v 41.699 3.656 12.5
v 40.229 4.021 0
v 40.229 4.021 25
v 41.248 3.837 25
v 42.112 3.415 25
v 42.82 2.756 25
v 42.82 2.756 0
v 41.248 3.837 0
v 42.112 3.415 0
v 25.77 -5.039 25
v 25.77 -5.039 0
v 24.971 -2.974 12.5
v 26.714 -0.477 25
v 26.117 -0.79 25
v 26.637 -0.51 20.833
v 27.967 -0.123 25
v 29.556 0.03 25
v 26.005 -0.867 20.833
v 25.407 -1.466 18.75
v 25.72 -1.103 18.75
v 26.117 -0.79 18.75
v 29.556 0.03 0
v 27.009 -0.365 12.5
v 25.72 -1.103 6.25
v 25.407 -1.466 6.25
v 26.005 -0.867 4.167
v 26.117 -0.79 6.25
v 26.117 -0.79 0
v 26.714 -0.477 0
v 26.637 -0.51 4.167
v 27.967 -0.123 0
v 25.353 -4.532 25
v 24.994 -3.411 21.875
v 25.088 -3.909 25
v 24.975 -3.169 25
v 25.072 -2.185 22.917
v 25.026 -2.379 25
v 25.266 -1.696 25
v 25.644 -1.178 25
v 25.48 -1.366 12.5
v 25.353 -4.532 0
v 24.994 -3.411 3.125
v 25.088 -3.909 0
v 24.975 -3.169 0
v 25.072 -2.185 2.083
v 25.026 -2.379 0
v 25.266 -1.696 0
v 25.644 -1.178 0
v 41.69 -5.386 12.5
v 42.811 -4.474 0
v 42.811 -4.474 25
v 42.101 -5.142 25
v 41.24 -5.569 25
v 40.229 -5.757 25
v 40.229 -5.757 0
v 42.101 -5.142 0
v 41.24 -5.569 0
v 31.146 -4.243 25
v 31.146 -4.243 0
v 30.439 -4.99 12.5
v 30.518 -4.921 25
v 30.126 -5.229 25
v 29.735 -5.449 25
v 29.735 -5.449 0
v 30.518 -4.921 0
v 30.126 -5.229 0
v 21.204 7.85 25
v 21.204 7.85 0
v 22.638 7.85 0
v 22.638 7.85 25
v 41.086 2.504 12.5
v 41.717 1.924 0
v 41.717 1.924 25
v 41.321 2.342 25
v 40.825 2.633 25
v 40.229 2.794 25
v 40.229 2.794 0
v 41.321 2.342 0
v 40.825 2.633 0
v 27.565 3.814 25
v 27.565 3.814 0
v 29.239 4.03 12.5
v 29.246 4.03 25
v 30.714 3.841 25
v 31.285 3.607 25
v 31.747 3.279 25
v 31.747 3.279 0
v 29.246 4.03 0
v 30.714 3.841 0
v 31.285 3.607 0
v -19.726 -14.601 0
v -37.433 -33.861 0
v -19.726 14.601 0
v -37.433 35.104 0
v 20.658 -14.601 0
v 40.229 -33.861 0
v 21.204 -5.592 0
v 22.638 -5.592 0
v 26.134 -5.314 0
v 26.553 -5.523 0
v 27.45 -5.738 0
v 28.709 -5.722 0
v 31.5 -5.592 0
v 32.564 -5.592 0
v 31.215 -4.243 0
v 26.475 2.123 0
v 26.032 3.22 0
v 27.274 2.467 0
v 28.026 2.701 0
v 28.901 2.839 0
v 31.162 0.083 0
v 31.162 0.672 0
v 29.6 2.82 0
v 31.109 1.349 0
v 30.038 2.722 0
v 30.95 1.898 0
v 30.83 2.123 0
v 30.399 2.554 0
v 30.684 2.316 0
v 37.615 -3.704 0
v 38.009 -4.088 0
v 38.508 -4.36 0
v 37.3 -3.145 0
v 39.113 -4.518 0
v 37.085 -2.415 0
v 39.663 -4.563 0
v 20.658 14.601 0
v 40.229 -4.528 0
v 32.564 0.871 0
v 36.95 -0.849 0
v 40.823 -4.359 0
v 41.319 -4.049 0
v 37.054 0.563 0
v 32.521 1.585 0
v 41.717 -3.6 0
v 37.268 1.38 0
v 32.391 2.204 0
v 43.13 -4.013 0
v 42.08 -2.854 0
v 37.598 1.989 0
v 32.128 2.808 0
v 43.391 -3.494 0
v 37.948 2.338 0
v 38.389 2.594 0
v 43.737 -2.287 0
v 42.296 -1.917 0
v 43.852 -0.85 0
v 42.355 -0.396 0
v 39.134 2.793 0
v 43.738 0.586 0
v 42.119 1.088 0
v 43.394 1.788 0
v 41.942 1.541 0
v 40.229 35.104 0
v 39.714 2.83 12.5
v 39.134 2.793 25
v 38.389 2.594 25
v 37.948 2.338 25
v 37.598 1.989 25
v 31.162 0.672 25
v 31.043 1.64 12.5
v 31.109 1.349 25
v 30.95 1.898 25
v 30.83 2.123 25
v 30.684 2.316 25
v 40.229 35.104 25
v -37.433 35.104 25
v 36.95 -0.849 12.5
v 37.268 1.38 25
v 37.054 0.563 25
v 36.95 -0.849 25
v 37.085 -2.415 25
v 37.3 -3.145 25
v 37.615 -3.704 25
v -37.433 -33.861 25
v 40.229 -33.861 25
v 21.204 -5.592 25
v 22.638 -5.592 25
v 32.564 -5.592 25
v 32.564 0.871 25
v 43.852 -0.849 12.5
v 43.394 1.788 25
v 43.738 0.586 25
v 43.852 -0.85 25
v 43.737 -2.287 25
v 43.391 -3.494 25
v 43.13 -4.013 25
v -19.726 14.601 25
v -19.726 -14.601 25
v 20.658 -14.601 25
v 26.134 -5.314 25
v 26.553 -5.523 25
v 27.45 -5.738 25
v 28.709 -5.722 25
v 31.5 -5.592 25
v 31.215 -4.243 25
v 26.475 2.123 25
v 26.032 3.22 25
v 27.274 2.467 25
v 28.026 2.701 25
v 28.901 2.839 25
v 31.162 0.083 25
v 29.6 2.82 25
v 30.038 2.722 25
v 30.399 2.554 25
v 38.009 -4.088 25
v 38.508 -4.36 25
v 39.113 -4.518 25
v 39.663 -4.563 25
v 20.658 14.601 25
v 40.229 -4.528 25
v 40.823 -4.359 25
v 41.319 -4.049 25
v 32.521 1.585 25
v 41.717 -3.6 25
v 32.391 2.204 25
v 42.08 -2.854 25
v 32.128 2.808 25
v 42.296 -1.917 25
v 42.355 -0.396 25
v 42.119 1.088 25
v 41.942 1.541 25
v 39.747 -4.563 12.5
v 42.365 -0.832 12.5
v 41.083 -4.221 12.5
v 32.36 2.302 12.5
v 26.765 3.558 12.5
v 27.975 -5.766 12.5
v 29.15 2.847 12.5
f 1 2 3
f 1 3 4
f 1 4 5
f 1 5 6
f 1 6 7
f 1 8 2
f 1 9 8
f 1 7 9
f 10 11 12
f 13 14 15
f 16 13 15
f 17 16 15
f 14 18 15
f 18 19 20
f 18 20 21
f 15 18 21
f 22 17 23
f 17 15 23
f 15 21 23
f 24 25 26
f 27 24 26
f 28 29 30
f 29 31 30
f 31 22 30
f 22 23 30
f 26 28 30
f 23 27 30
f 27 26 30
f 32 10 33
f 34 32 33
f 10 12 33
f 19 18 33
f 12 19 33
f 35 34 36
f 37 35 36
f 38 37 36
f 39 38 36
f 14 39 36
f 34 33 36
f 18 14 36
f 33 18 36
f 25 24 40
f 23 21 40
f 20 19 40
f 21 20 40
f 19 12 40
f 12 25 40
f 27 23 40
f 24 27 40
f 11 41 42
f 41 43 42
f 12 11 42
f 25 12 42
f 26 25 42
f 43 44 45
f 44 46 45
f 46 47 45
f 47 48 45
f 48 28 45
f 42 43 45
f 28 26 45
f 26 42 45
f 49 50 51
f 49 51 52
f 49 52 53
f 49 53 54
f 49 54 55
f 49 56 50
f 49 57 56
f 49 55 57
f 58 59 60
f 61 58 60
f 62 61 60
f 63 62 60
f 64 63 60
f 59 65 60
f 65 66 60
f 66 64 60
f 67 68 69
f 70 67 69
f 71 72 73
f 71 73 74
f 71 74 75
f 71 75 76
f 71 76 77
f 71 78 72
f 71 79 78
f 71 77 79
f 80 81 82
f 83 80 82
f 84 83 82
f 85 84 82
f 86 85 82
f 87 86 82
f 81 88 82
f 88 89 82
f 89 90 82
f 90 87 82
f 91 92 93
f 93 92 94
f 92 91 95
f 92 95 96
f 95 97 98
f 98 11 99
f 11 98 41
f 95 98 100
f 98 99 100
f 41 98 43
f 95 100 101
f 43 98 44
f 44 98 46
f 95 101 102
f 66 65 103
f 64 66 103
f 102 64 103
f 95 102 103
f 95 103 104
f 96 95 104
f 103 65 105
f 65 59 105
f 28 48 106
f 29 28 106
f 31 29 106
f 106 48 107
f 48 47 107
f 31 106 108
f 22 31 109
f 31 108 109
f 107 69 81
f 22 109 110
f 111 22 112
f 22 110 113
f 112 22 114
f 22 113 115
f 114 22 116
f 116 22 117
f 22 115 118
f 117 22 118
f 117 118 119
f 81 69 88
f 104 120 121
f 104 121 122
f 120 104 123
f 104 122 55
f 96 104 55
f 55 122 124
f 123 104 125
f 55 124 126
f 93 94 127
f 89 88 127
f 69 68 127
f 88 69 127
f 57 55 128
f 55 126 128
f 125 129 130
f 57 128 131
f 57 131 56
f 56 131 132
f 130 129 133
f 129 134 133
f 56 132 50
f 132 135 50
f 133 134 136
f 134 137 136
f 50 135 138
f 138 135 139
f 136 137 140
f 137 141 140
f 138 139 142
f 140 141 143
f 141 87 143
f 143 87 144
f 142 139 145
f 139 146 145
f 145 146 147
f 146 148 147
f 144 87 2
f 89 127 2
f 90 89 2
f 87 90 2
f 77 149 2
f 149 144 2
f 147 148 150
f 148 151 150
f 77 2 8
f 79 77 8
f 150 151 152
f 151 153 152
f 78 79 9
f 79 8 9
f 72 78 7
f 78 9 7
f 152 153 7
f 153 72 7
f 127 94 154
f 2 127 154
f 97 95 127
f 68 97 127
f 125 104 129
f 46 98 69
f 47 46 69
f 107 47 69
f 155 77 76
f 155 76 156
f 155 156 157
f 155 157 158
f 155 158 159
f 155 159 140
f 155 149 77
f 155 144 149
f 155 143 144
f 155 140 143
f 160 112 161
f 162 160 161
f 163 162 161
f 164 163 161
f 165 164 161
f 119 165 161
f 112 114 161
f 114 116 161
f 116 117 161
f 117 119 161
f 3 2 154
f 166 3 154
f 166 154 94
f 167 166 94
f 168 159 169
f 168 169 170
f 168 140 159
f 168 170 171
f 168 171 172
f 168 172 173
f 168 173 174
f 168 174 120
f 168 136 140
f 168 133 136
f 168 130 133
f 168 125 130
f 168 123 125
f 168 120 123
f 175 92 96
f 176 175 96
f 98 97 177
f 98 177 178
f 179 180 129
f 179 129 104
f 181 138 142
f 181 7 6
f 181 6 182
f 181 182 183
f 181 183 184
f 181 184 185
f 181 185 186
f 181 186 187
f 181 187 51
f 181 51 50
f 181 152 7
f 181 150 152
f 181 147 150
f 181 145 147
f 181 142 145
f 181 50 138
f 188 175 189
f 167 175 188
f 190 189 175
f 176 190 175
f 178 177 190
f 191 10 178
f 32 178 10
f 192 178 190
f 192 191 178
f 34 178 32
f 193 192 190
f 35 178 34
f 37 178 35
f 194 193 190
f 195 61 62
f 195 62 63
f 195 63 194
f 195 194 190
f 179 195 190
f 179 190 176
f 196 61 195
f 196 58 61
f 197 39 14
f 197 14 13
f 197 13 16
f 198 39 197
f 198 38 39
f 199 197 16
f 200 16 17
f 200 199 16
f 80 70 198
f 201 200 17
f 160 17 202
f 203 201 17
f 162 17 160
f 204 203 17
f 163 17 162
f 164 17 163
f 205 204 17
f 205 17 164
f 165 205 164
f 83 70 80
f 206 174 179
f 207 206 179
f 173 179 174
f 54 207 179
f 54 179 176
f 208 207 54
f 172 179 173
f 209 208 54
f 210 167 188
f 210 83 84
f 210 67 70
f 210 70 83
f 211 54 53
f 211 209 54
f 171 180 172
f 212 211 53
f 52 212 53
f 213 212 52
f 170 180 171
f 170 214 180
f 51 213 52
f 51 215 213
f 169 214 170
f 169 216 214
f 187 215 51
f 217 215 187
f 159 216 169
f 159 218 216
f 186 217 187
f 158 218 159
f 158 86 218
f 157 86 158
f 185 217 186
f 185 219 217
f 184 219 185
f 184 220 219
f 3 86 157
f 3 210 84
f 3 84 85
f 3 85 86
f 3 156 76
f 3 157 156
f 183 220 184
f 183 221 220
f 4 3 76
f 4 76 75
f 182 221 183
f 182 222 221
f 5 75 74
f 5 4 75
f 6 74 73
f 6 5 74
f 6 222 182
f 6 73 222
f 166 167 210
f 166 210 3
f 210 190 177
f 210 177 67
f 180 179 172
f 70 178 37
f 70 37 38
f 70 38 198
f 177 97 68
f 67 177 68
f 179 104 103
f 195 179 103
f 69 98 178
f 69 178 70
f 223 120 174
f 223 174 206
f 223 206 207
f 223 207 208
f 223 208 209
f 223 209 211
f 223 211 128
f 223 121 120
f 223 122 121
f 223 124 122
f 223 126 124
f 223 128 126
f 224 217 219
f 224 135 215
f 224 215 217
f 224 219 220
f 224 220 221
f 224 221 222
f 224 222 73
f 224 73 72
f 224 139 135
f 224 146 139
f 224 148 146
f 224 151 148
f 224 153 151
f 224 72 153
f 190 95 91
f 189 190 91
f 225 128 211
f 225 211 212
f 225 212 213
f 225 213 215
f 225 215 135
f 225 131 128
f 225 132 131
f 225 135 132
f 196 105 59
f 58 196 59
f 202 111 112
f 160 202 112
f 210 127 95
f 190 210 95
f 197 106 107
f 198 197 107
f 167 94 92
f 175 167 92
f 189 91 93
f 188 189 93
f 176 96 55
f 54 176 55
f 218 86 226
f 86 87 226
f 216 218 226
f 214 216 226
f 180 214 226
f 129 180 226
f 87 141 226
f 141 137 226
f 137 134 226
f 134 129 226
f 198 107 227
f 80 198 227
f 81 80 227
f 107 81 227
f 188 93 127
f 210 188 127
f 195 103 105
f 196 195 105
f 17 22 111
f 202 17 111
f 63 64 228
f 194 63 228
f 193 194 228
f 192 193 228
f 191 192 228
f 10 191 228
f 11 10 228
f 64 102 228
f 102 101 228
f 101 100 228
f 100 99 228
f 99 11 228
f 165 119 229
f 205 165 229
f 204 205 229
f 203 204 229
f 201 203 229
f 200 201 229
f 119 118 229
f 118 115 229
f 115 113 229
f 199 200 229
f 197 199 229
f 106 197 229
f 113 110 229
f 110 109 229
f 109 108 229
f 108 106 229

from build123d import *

# Parameters (mm, degrees)
F0_W     = 1.4345356546
F0_H     = 13.4415161623
F1_DEPTH = 25


with BuildPart() as f1:
    # F0 (on Top) → F1 (new body)
    with BuildSketch(Plane.XY):
        Polygon((-19.7263322771, 14.6005926654), (-37.4334342778, 35.1035520434), (-37.4334342778, -33.8609479368), (-19.7263322771, -14.6005926654), align=None)
        Polygon((40.2292944491, 35.1035520434), (-37.4334342778, 35.1035520434), (-19.7263322771, 14.6005926654), (20.6582844257, 14.6005926654), align=None)
        with BuildLine():
            Line((40.2292944491, 4.0209012059), (40.2292944491, 35.1035520434))
            Line((40.2292944491, 35.1035520434), (20.6582844257, 14.6005926654))
            Line((20.6582844257, 14.6005926654), (20.6582844257, -14.6005926654))
            Line((20.6582844257, -14.6005926654), (40.2292944491, -33.8609479368))
            Line((40.2292944491, -33.8609479368), (40.2292944491, -5.7565652547))
            add(Edge.make_bspline(
                [(40.2292944491, -5.7565652547), (40.0783549242, -5.7658505375), (39.9216058908, -5.7658505375)],
                knots=[0.915231448, 0.915231448, 0.915231448, 1, 1, 1], degree=2))
            add(Edge.make_bspline(
                [(39.9216058908, -5.7658505375), (38.9956532043, -5.7658505375), (38.2313967333, -5.4244918605)],
                knots=[0, 0, 0, 1, 1, 1], degree=2))
            add(Edge.make_bspline(
                [(38.2313967333, -5.4244918605), (37.4671402622, -5.0831331836), (36.9502651805, -4.372775451)],
                knots=[0, 0, 0, 1, 1, 1], degree=2))
            Line((36.9502651805, -4.372775451), (36.8452317414, -4.372775451))
            Line((36.8452317414, -4.372775451), (36.5439516136, -5.5917161517))
            Line((36.5439516136, -5.5917161517), (35.5157295259, -5.5917161517))
            Line((35.5157295259, -5.5917161517), (35.5157295259, 7.8498000106))
            Line((35.5157295259, 7.8498000106), (36.9502651805, 7.8498000106))
            Line((36.9502651805, 7.8498000106), (36.9502651805, 4.5827072481))
            add(Edge.make_bspline(
                [(36.9502651805, 4.5827072481), (36.9502651805, 3.4853842137), (36.8811642337, 2.6147122846)],
                knots=[0, 0, 0, 1, 1, 1], degree=2))
            Line((36.8811642337, 2.6147122846), (36.9502651805, 2.6147122846))
            add(Edge.make_bspline(
                [(36.9502651805, 2.6147122846), (37.9508468894, 4.0298996741), (39.9216058908, 4.0298996741)],
                knots=[0, 0, 0, 1, 1, 1], degree=2))
            add(Edge.make_bspline(
                [(39.9216058908, 4.0298996741), (40.0783927276, 4.0298996741), (40.2292944491, 4.0209012059)],
                knots=[0, 0, 0, 0.0840353158, 0.0840353158, 0.0840353158], degree=2))
        make_face()
        with BuildLine():
            Line((32.5637370806, -5.5917161517), (31.4995825007, -5.5917161517))
            Line((31.4995825007, -5.5917161517), (31.2148866, -4.2428656711))
            Line((31.2148866, -4.2428656711), (31.1457856533, -4.2428656711))
            add(Edge.make_bspline(
                [(31.1457856533, -4.2428656711), (30.4381919585, -5.1328858652), (29.7347443206, -5.4493682014)],
                knots=[0, 0, 0, 1, 1, 1], degree=2))
            add(Edge.make_bspline(
                [(29.7347443206, -5.4493682014), (29.0312966827, -5.7658505375), (27.9754342163, -5.7658505375)],
                knots=[0, 0, 0, 1, 1, 1], degree=2))
            add(Edge.make_bspline(
                [(27.9754342163, -5.7658505375), (26.5685389404, -5.7658505375), (25.769731996, -5.0389085777)],
                knots=[0, 0, 0, 1, 1, 1], degree=2))
            add(Edge.make_bspline(
                [(25.769731996, -5.0389085777), (24.9709250515, -4.3119666178), (24.9709250515, -2.9741722887)],
                knots=[0, 0, 0, 1, 1, 1], degree=2))
            add(Edge.make_bspline(
                [(24.9709250515, -2.9741722887), (24.9709250515, -0.1078650174), (29.556463878, 0.0303368761)],
                knots=[0, 0, 0, 1, 1, 1], degree=2))
            Line((29.556463878, 0.0303368761), (31.1623698805, 0.0828535956))
            Line((31.1623698805, 0.0828535956), (31.1623698805, 0.6715936619))
            add(Edge.make_bspline(
                [(31.1623698805, 0.6715936619), (31.1623698805, 1.7855009236), (30.684191329, 2.3161961946)],
                knots=[0, 0, 0, 1, 1, 1], degree=2))
            add(Edge.make_bspline(
                [(30.684191329, 2.3161961946), (30.2060127774, 2.8468914657), (29.1501503111, 2.8468914657)],
                knots=[0, 0, 0, 1, 1, 1], degree=2))
            add(Edge.make_bspline(
                [(29.1501503111, 2.8468914657), (27.9671421027, 2.8468914657), (26.4745616528, 2.1227135437)],
                knots=[0, 0, 0, 1, 1, 1], degree=2))
            Line((26.4745616528, 2.1227135437), (26.0323155936, 3.2200365782))
            add(Edge.make_bspline(
                [(26.0323155936, 3.2200365782), (26.7316171747, 3.5987097664), (27.5649745926, 3.8143047202)],
                knots=[0, 0, 0, 1, 1, 1], degree=2))
            add(Edge.make_bspline(
                [(27.5649745926, 3.8143047202), (28.3983320104, 4.0298996741), (29.2385995229, 4.0298996741)],
                knots=[0, 0, 0, 1, 1, 1], degree=2))
            add(Edge.make_bspline(
                [(29.2385995229, 4.0298996741), (30.9301906994, 4.0298996741), (31.74696389, 3.2794633924)],
                knots=[0, 0, 0, 1, 1, 1], degree=2))
            add(Edge.make_bspline(
                [(31.74696389, 3.2794633924), (32.5637370806, 2.5290271106), (32.5637370806, 0.8706043886)],
                knots=[0, 0, 0, 1, 1, 1], degree=2))
            Line((32.5637370806, 0.8706043886), (32.5637370806, -5.5917161517))
        make_face(mode=Mode.SUBTRACT)
        with Locations((21.9208092619, 1.1290419294)):
            Rectangle(F0_W, F0_H, mode=Mode.SUBTRACT)
        Polygon((-19.7263322771, -14.6005926654), (-37.4334342778, -33.8609479368), (40.2292944491, -33.8609479368), (20.6582844257, -14.6005926654), align=None)
        with BuildLine():
            add(Edge.make_bspline(
                [(40.2292944491, 4.0209012059), (41.8740868362, 3.9228200715), (42.8196995976, 2.755678216)],
                knots=[0.0840353158, 0.0840353158, 0.0840353158, 1, 1, 1], degree=2))
            Line((40.2292944491, 4.0209012059), (40.2292944491, 2.7938202111))
            add(Edge.make_bspline(
                [(41.7168484874, 1.9237028171), (41.1987126844, 2.6484300811), (40.2292944491, 2.7938202111)],
                knots=[0, 0, 0, 0.7993864214, 0.7993864214, 0.7993864214], degree=2))
            add(Edge.make_bspline(
                [(42.365015368, -0.8320429394), (42.365015368, 1.0170983957), (41.7168484874, 1.9237028171)],
                knots=[0, 0, 0, 1, 1, 1], degree=2))
            add(Edge.make_bspline(
                [(41.7168484874, -3.6002268663), (42.365015368, -2.6369596686), (42.365015368, -0.8320429394)],
                knots=[0, 0, 0, 1, 1, 1], degree=2))
            add(Edge.make_bspline(
                [(40.2292944491, -4.528094354), (41.1929364436, -4.378833891), (41.7168484874, -3.6002268663)],
                knots=[0.1917019218, 0.1917019218, 0.1917019218, 1, 1, 1], degree=2))
            Line((40.2292944491, -4.528094354), (40.2292944491, -5.7565652547))
            add(Edge.make_bspline(
                [(42.811407484, -4.4736628332), (41.8589624891, -5.6563136569), (40.2292944491, -5.7565652547)],
                knots=[0, 0, 0, 0.915231448, 0.915231448, 0.915231448], degree=2))
            add(Edge.make_bspline(
                [(43.8520677421, -0.8486271666), (43.8520677421, -3.181475129), (42.811407484, -4.4736628332)],
                knots=[0, 0, 0, 1, 1, 1], degree=2))
            add(Edge.make_bspline(
                [(42.8196995976, 2.755678216), (43.8520677421, 1.4814567579), (43.8520677421, -0.8486271666)],
                knots=[0, 0, 0, 1, 1, 1], degree=2))
        make_face()
        with BuildLine():
            Line((40.2292944491, 2.7938202111), (40.2292944491, 4.0209012059))
            add(Edge.make_bspline(
                [(39.9216058908, 4.0298996741), (40.0783927276, 4.0298996741), (40.2292944491, 4.0209012059)],
                knots=[0, 0, 0, 0.0840353158, 0.0840353158, 0.0840353158], degree=2))
            add(Edge.make_bspline(
                [(36.9502651805, 2.6147122846), (37.9508468894, 4.0298996741), (39.9216058908, 4.0298996741)],
                knots=[0, 0, 0, 1, 1, 1], degree=2))
            Line((36.9502651805, 2.6147122846), (36.8811642337, 2.6147122846))
            add(Edge.make_bspline(
                [(36.9502651805, 4.5827072481), (36.9502651805, 3.4853842137), (36.8811642337, 2.6147122846)],
                knots=[0, 0, 0, 1, 1, 1], degree=2))
            Line((36.9502651805, 4.5827072481), (36.9502651805, 7.8498000106))
            Line((36.9502651805, 7.8498000106), (35.5157295259, 7.8498000106))
            Line((35.5157295259, 7.8498000106), (35.5157295259, -5.5917161517))
            Line((35.5157295259, -5.5917161517), (36.5439516136, -5.5917161517))
            Line((36.5439516136, -5.5917161517), (36.8452317414, -4.372775451))
            Line((36.8452317414, -4.372775451), (36.9502651805, -4.372775451))
            add(Edge.make_bspline(
                [(38.2313967333, -5.4244918605), (37.4671402622, -5.0831331836), (36.9502651805, -4.372775451)],
                knots=[0, 0, 0, 1, 1, 1], degree=2))
            add(Edge.make_bspline(
                [(39.9216058908, -5.7658505375), (38.9956532043, -5.7658505375), (38.2313967333, -5.4244918605)],
                knots=[0, 0, 0, 1, 1, 1], degree=2))
            add(Edge.make_bspline(
                [(40.2292944491, -5.7565652547), (40.0783549242, -5.7658505375), (39.9216058908, -5.7658505375)],
                knots=[0.915231448, 0.915231448, 0.915231448, 1, 1, 1], degree=2))
            Line((40.2292944491, -5.7565652547), (40.2292944491, -4.528094354))
            add(Edge.make_bspline(
                [(39.747471505, -4.563494064), (40.0007500207, -4.563494064), (40.2292944491, -4.528094354)],
                knots=[0, 0, 0, 0.1917019218, 0.1917019218, 0.1917019218], degree=2))
            add(Edge.make_bspline(
                [(37.6150162882, -3.7038782864), (38.279767396, -4.563494064), (39.747471505, -4.563494064)],
                knots=[0, 0, 0, 1, 1, 1], degree=2))
            add(Edge.make_bspline(
                [(36.9502651805, -0.8486271666), (36.9502651805, -2.8442625088), (37.6150162882, -3.7038782864)],
                knots=[0, 0, 0, 1, 1, 1], degree=2))
            add(Edge.make_bspline(
                [(37.598432061, 1.988657707), (36.9502651805, 1.1470081756), (36.9502651805, -0.8486271666)],
                knots=[0, 0, 0, 1, 1, 1], degree=2))
            add(Edge.make_bspline(
                [(39.7143030506, 2.8303072385), (38.2465989415, 2.8303072385), (37.598432061, 1.988657707)],
                knots=[0, 0, 0, 1, 1, 1], degree=2))
            add(Edge.make_bspline(
                [(40.2292944491, 2.7938202111), (39.9860097796, 2.8303072385), (39.7143030506, 2.8303072385)],
                knots=[0.7993864214, 0.7993864214, 0.7993864214, 1, 1, 1], degree=2))
        make_face()
    extrude(amount=F1_DEPTH)


solid = f1.part
